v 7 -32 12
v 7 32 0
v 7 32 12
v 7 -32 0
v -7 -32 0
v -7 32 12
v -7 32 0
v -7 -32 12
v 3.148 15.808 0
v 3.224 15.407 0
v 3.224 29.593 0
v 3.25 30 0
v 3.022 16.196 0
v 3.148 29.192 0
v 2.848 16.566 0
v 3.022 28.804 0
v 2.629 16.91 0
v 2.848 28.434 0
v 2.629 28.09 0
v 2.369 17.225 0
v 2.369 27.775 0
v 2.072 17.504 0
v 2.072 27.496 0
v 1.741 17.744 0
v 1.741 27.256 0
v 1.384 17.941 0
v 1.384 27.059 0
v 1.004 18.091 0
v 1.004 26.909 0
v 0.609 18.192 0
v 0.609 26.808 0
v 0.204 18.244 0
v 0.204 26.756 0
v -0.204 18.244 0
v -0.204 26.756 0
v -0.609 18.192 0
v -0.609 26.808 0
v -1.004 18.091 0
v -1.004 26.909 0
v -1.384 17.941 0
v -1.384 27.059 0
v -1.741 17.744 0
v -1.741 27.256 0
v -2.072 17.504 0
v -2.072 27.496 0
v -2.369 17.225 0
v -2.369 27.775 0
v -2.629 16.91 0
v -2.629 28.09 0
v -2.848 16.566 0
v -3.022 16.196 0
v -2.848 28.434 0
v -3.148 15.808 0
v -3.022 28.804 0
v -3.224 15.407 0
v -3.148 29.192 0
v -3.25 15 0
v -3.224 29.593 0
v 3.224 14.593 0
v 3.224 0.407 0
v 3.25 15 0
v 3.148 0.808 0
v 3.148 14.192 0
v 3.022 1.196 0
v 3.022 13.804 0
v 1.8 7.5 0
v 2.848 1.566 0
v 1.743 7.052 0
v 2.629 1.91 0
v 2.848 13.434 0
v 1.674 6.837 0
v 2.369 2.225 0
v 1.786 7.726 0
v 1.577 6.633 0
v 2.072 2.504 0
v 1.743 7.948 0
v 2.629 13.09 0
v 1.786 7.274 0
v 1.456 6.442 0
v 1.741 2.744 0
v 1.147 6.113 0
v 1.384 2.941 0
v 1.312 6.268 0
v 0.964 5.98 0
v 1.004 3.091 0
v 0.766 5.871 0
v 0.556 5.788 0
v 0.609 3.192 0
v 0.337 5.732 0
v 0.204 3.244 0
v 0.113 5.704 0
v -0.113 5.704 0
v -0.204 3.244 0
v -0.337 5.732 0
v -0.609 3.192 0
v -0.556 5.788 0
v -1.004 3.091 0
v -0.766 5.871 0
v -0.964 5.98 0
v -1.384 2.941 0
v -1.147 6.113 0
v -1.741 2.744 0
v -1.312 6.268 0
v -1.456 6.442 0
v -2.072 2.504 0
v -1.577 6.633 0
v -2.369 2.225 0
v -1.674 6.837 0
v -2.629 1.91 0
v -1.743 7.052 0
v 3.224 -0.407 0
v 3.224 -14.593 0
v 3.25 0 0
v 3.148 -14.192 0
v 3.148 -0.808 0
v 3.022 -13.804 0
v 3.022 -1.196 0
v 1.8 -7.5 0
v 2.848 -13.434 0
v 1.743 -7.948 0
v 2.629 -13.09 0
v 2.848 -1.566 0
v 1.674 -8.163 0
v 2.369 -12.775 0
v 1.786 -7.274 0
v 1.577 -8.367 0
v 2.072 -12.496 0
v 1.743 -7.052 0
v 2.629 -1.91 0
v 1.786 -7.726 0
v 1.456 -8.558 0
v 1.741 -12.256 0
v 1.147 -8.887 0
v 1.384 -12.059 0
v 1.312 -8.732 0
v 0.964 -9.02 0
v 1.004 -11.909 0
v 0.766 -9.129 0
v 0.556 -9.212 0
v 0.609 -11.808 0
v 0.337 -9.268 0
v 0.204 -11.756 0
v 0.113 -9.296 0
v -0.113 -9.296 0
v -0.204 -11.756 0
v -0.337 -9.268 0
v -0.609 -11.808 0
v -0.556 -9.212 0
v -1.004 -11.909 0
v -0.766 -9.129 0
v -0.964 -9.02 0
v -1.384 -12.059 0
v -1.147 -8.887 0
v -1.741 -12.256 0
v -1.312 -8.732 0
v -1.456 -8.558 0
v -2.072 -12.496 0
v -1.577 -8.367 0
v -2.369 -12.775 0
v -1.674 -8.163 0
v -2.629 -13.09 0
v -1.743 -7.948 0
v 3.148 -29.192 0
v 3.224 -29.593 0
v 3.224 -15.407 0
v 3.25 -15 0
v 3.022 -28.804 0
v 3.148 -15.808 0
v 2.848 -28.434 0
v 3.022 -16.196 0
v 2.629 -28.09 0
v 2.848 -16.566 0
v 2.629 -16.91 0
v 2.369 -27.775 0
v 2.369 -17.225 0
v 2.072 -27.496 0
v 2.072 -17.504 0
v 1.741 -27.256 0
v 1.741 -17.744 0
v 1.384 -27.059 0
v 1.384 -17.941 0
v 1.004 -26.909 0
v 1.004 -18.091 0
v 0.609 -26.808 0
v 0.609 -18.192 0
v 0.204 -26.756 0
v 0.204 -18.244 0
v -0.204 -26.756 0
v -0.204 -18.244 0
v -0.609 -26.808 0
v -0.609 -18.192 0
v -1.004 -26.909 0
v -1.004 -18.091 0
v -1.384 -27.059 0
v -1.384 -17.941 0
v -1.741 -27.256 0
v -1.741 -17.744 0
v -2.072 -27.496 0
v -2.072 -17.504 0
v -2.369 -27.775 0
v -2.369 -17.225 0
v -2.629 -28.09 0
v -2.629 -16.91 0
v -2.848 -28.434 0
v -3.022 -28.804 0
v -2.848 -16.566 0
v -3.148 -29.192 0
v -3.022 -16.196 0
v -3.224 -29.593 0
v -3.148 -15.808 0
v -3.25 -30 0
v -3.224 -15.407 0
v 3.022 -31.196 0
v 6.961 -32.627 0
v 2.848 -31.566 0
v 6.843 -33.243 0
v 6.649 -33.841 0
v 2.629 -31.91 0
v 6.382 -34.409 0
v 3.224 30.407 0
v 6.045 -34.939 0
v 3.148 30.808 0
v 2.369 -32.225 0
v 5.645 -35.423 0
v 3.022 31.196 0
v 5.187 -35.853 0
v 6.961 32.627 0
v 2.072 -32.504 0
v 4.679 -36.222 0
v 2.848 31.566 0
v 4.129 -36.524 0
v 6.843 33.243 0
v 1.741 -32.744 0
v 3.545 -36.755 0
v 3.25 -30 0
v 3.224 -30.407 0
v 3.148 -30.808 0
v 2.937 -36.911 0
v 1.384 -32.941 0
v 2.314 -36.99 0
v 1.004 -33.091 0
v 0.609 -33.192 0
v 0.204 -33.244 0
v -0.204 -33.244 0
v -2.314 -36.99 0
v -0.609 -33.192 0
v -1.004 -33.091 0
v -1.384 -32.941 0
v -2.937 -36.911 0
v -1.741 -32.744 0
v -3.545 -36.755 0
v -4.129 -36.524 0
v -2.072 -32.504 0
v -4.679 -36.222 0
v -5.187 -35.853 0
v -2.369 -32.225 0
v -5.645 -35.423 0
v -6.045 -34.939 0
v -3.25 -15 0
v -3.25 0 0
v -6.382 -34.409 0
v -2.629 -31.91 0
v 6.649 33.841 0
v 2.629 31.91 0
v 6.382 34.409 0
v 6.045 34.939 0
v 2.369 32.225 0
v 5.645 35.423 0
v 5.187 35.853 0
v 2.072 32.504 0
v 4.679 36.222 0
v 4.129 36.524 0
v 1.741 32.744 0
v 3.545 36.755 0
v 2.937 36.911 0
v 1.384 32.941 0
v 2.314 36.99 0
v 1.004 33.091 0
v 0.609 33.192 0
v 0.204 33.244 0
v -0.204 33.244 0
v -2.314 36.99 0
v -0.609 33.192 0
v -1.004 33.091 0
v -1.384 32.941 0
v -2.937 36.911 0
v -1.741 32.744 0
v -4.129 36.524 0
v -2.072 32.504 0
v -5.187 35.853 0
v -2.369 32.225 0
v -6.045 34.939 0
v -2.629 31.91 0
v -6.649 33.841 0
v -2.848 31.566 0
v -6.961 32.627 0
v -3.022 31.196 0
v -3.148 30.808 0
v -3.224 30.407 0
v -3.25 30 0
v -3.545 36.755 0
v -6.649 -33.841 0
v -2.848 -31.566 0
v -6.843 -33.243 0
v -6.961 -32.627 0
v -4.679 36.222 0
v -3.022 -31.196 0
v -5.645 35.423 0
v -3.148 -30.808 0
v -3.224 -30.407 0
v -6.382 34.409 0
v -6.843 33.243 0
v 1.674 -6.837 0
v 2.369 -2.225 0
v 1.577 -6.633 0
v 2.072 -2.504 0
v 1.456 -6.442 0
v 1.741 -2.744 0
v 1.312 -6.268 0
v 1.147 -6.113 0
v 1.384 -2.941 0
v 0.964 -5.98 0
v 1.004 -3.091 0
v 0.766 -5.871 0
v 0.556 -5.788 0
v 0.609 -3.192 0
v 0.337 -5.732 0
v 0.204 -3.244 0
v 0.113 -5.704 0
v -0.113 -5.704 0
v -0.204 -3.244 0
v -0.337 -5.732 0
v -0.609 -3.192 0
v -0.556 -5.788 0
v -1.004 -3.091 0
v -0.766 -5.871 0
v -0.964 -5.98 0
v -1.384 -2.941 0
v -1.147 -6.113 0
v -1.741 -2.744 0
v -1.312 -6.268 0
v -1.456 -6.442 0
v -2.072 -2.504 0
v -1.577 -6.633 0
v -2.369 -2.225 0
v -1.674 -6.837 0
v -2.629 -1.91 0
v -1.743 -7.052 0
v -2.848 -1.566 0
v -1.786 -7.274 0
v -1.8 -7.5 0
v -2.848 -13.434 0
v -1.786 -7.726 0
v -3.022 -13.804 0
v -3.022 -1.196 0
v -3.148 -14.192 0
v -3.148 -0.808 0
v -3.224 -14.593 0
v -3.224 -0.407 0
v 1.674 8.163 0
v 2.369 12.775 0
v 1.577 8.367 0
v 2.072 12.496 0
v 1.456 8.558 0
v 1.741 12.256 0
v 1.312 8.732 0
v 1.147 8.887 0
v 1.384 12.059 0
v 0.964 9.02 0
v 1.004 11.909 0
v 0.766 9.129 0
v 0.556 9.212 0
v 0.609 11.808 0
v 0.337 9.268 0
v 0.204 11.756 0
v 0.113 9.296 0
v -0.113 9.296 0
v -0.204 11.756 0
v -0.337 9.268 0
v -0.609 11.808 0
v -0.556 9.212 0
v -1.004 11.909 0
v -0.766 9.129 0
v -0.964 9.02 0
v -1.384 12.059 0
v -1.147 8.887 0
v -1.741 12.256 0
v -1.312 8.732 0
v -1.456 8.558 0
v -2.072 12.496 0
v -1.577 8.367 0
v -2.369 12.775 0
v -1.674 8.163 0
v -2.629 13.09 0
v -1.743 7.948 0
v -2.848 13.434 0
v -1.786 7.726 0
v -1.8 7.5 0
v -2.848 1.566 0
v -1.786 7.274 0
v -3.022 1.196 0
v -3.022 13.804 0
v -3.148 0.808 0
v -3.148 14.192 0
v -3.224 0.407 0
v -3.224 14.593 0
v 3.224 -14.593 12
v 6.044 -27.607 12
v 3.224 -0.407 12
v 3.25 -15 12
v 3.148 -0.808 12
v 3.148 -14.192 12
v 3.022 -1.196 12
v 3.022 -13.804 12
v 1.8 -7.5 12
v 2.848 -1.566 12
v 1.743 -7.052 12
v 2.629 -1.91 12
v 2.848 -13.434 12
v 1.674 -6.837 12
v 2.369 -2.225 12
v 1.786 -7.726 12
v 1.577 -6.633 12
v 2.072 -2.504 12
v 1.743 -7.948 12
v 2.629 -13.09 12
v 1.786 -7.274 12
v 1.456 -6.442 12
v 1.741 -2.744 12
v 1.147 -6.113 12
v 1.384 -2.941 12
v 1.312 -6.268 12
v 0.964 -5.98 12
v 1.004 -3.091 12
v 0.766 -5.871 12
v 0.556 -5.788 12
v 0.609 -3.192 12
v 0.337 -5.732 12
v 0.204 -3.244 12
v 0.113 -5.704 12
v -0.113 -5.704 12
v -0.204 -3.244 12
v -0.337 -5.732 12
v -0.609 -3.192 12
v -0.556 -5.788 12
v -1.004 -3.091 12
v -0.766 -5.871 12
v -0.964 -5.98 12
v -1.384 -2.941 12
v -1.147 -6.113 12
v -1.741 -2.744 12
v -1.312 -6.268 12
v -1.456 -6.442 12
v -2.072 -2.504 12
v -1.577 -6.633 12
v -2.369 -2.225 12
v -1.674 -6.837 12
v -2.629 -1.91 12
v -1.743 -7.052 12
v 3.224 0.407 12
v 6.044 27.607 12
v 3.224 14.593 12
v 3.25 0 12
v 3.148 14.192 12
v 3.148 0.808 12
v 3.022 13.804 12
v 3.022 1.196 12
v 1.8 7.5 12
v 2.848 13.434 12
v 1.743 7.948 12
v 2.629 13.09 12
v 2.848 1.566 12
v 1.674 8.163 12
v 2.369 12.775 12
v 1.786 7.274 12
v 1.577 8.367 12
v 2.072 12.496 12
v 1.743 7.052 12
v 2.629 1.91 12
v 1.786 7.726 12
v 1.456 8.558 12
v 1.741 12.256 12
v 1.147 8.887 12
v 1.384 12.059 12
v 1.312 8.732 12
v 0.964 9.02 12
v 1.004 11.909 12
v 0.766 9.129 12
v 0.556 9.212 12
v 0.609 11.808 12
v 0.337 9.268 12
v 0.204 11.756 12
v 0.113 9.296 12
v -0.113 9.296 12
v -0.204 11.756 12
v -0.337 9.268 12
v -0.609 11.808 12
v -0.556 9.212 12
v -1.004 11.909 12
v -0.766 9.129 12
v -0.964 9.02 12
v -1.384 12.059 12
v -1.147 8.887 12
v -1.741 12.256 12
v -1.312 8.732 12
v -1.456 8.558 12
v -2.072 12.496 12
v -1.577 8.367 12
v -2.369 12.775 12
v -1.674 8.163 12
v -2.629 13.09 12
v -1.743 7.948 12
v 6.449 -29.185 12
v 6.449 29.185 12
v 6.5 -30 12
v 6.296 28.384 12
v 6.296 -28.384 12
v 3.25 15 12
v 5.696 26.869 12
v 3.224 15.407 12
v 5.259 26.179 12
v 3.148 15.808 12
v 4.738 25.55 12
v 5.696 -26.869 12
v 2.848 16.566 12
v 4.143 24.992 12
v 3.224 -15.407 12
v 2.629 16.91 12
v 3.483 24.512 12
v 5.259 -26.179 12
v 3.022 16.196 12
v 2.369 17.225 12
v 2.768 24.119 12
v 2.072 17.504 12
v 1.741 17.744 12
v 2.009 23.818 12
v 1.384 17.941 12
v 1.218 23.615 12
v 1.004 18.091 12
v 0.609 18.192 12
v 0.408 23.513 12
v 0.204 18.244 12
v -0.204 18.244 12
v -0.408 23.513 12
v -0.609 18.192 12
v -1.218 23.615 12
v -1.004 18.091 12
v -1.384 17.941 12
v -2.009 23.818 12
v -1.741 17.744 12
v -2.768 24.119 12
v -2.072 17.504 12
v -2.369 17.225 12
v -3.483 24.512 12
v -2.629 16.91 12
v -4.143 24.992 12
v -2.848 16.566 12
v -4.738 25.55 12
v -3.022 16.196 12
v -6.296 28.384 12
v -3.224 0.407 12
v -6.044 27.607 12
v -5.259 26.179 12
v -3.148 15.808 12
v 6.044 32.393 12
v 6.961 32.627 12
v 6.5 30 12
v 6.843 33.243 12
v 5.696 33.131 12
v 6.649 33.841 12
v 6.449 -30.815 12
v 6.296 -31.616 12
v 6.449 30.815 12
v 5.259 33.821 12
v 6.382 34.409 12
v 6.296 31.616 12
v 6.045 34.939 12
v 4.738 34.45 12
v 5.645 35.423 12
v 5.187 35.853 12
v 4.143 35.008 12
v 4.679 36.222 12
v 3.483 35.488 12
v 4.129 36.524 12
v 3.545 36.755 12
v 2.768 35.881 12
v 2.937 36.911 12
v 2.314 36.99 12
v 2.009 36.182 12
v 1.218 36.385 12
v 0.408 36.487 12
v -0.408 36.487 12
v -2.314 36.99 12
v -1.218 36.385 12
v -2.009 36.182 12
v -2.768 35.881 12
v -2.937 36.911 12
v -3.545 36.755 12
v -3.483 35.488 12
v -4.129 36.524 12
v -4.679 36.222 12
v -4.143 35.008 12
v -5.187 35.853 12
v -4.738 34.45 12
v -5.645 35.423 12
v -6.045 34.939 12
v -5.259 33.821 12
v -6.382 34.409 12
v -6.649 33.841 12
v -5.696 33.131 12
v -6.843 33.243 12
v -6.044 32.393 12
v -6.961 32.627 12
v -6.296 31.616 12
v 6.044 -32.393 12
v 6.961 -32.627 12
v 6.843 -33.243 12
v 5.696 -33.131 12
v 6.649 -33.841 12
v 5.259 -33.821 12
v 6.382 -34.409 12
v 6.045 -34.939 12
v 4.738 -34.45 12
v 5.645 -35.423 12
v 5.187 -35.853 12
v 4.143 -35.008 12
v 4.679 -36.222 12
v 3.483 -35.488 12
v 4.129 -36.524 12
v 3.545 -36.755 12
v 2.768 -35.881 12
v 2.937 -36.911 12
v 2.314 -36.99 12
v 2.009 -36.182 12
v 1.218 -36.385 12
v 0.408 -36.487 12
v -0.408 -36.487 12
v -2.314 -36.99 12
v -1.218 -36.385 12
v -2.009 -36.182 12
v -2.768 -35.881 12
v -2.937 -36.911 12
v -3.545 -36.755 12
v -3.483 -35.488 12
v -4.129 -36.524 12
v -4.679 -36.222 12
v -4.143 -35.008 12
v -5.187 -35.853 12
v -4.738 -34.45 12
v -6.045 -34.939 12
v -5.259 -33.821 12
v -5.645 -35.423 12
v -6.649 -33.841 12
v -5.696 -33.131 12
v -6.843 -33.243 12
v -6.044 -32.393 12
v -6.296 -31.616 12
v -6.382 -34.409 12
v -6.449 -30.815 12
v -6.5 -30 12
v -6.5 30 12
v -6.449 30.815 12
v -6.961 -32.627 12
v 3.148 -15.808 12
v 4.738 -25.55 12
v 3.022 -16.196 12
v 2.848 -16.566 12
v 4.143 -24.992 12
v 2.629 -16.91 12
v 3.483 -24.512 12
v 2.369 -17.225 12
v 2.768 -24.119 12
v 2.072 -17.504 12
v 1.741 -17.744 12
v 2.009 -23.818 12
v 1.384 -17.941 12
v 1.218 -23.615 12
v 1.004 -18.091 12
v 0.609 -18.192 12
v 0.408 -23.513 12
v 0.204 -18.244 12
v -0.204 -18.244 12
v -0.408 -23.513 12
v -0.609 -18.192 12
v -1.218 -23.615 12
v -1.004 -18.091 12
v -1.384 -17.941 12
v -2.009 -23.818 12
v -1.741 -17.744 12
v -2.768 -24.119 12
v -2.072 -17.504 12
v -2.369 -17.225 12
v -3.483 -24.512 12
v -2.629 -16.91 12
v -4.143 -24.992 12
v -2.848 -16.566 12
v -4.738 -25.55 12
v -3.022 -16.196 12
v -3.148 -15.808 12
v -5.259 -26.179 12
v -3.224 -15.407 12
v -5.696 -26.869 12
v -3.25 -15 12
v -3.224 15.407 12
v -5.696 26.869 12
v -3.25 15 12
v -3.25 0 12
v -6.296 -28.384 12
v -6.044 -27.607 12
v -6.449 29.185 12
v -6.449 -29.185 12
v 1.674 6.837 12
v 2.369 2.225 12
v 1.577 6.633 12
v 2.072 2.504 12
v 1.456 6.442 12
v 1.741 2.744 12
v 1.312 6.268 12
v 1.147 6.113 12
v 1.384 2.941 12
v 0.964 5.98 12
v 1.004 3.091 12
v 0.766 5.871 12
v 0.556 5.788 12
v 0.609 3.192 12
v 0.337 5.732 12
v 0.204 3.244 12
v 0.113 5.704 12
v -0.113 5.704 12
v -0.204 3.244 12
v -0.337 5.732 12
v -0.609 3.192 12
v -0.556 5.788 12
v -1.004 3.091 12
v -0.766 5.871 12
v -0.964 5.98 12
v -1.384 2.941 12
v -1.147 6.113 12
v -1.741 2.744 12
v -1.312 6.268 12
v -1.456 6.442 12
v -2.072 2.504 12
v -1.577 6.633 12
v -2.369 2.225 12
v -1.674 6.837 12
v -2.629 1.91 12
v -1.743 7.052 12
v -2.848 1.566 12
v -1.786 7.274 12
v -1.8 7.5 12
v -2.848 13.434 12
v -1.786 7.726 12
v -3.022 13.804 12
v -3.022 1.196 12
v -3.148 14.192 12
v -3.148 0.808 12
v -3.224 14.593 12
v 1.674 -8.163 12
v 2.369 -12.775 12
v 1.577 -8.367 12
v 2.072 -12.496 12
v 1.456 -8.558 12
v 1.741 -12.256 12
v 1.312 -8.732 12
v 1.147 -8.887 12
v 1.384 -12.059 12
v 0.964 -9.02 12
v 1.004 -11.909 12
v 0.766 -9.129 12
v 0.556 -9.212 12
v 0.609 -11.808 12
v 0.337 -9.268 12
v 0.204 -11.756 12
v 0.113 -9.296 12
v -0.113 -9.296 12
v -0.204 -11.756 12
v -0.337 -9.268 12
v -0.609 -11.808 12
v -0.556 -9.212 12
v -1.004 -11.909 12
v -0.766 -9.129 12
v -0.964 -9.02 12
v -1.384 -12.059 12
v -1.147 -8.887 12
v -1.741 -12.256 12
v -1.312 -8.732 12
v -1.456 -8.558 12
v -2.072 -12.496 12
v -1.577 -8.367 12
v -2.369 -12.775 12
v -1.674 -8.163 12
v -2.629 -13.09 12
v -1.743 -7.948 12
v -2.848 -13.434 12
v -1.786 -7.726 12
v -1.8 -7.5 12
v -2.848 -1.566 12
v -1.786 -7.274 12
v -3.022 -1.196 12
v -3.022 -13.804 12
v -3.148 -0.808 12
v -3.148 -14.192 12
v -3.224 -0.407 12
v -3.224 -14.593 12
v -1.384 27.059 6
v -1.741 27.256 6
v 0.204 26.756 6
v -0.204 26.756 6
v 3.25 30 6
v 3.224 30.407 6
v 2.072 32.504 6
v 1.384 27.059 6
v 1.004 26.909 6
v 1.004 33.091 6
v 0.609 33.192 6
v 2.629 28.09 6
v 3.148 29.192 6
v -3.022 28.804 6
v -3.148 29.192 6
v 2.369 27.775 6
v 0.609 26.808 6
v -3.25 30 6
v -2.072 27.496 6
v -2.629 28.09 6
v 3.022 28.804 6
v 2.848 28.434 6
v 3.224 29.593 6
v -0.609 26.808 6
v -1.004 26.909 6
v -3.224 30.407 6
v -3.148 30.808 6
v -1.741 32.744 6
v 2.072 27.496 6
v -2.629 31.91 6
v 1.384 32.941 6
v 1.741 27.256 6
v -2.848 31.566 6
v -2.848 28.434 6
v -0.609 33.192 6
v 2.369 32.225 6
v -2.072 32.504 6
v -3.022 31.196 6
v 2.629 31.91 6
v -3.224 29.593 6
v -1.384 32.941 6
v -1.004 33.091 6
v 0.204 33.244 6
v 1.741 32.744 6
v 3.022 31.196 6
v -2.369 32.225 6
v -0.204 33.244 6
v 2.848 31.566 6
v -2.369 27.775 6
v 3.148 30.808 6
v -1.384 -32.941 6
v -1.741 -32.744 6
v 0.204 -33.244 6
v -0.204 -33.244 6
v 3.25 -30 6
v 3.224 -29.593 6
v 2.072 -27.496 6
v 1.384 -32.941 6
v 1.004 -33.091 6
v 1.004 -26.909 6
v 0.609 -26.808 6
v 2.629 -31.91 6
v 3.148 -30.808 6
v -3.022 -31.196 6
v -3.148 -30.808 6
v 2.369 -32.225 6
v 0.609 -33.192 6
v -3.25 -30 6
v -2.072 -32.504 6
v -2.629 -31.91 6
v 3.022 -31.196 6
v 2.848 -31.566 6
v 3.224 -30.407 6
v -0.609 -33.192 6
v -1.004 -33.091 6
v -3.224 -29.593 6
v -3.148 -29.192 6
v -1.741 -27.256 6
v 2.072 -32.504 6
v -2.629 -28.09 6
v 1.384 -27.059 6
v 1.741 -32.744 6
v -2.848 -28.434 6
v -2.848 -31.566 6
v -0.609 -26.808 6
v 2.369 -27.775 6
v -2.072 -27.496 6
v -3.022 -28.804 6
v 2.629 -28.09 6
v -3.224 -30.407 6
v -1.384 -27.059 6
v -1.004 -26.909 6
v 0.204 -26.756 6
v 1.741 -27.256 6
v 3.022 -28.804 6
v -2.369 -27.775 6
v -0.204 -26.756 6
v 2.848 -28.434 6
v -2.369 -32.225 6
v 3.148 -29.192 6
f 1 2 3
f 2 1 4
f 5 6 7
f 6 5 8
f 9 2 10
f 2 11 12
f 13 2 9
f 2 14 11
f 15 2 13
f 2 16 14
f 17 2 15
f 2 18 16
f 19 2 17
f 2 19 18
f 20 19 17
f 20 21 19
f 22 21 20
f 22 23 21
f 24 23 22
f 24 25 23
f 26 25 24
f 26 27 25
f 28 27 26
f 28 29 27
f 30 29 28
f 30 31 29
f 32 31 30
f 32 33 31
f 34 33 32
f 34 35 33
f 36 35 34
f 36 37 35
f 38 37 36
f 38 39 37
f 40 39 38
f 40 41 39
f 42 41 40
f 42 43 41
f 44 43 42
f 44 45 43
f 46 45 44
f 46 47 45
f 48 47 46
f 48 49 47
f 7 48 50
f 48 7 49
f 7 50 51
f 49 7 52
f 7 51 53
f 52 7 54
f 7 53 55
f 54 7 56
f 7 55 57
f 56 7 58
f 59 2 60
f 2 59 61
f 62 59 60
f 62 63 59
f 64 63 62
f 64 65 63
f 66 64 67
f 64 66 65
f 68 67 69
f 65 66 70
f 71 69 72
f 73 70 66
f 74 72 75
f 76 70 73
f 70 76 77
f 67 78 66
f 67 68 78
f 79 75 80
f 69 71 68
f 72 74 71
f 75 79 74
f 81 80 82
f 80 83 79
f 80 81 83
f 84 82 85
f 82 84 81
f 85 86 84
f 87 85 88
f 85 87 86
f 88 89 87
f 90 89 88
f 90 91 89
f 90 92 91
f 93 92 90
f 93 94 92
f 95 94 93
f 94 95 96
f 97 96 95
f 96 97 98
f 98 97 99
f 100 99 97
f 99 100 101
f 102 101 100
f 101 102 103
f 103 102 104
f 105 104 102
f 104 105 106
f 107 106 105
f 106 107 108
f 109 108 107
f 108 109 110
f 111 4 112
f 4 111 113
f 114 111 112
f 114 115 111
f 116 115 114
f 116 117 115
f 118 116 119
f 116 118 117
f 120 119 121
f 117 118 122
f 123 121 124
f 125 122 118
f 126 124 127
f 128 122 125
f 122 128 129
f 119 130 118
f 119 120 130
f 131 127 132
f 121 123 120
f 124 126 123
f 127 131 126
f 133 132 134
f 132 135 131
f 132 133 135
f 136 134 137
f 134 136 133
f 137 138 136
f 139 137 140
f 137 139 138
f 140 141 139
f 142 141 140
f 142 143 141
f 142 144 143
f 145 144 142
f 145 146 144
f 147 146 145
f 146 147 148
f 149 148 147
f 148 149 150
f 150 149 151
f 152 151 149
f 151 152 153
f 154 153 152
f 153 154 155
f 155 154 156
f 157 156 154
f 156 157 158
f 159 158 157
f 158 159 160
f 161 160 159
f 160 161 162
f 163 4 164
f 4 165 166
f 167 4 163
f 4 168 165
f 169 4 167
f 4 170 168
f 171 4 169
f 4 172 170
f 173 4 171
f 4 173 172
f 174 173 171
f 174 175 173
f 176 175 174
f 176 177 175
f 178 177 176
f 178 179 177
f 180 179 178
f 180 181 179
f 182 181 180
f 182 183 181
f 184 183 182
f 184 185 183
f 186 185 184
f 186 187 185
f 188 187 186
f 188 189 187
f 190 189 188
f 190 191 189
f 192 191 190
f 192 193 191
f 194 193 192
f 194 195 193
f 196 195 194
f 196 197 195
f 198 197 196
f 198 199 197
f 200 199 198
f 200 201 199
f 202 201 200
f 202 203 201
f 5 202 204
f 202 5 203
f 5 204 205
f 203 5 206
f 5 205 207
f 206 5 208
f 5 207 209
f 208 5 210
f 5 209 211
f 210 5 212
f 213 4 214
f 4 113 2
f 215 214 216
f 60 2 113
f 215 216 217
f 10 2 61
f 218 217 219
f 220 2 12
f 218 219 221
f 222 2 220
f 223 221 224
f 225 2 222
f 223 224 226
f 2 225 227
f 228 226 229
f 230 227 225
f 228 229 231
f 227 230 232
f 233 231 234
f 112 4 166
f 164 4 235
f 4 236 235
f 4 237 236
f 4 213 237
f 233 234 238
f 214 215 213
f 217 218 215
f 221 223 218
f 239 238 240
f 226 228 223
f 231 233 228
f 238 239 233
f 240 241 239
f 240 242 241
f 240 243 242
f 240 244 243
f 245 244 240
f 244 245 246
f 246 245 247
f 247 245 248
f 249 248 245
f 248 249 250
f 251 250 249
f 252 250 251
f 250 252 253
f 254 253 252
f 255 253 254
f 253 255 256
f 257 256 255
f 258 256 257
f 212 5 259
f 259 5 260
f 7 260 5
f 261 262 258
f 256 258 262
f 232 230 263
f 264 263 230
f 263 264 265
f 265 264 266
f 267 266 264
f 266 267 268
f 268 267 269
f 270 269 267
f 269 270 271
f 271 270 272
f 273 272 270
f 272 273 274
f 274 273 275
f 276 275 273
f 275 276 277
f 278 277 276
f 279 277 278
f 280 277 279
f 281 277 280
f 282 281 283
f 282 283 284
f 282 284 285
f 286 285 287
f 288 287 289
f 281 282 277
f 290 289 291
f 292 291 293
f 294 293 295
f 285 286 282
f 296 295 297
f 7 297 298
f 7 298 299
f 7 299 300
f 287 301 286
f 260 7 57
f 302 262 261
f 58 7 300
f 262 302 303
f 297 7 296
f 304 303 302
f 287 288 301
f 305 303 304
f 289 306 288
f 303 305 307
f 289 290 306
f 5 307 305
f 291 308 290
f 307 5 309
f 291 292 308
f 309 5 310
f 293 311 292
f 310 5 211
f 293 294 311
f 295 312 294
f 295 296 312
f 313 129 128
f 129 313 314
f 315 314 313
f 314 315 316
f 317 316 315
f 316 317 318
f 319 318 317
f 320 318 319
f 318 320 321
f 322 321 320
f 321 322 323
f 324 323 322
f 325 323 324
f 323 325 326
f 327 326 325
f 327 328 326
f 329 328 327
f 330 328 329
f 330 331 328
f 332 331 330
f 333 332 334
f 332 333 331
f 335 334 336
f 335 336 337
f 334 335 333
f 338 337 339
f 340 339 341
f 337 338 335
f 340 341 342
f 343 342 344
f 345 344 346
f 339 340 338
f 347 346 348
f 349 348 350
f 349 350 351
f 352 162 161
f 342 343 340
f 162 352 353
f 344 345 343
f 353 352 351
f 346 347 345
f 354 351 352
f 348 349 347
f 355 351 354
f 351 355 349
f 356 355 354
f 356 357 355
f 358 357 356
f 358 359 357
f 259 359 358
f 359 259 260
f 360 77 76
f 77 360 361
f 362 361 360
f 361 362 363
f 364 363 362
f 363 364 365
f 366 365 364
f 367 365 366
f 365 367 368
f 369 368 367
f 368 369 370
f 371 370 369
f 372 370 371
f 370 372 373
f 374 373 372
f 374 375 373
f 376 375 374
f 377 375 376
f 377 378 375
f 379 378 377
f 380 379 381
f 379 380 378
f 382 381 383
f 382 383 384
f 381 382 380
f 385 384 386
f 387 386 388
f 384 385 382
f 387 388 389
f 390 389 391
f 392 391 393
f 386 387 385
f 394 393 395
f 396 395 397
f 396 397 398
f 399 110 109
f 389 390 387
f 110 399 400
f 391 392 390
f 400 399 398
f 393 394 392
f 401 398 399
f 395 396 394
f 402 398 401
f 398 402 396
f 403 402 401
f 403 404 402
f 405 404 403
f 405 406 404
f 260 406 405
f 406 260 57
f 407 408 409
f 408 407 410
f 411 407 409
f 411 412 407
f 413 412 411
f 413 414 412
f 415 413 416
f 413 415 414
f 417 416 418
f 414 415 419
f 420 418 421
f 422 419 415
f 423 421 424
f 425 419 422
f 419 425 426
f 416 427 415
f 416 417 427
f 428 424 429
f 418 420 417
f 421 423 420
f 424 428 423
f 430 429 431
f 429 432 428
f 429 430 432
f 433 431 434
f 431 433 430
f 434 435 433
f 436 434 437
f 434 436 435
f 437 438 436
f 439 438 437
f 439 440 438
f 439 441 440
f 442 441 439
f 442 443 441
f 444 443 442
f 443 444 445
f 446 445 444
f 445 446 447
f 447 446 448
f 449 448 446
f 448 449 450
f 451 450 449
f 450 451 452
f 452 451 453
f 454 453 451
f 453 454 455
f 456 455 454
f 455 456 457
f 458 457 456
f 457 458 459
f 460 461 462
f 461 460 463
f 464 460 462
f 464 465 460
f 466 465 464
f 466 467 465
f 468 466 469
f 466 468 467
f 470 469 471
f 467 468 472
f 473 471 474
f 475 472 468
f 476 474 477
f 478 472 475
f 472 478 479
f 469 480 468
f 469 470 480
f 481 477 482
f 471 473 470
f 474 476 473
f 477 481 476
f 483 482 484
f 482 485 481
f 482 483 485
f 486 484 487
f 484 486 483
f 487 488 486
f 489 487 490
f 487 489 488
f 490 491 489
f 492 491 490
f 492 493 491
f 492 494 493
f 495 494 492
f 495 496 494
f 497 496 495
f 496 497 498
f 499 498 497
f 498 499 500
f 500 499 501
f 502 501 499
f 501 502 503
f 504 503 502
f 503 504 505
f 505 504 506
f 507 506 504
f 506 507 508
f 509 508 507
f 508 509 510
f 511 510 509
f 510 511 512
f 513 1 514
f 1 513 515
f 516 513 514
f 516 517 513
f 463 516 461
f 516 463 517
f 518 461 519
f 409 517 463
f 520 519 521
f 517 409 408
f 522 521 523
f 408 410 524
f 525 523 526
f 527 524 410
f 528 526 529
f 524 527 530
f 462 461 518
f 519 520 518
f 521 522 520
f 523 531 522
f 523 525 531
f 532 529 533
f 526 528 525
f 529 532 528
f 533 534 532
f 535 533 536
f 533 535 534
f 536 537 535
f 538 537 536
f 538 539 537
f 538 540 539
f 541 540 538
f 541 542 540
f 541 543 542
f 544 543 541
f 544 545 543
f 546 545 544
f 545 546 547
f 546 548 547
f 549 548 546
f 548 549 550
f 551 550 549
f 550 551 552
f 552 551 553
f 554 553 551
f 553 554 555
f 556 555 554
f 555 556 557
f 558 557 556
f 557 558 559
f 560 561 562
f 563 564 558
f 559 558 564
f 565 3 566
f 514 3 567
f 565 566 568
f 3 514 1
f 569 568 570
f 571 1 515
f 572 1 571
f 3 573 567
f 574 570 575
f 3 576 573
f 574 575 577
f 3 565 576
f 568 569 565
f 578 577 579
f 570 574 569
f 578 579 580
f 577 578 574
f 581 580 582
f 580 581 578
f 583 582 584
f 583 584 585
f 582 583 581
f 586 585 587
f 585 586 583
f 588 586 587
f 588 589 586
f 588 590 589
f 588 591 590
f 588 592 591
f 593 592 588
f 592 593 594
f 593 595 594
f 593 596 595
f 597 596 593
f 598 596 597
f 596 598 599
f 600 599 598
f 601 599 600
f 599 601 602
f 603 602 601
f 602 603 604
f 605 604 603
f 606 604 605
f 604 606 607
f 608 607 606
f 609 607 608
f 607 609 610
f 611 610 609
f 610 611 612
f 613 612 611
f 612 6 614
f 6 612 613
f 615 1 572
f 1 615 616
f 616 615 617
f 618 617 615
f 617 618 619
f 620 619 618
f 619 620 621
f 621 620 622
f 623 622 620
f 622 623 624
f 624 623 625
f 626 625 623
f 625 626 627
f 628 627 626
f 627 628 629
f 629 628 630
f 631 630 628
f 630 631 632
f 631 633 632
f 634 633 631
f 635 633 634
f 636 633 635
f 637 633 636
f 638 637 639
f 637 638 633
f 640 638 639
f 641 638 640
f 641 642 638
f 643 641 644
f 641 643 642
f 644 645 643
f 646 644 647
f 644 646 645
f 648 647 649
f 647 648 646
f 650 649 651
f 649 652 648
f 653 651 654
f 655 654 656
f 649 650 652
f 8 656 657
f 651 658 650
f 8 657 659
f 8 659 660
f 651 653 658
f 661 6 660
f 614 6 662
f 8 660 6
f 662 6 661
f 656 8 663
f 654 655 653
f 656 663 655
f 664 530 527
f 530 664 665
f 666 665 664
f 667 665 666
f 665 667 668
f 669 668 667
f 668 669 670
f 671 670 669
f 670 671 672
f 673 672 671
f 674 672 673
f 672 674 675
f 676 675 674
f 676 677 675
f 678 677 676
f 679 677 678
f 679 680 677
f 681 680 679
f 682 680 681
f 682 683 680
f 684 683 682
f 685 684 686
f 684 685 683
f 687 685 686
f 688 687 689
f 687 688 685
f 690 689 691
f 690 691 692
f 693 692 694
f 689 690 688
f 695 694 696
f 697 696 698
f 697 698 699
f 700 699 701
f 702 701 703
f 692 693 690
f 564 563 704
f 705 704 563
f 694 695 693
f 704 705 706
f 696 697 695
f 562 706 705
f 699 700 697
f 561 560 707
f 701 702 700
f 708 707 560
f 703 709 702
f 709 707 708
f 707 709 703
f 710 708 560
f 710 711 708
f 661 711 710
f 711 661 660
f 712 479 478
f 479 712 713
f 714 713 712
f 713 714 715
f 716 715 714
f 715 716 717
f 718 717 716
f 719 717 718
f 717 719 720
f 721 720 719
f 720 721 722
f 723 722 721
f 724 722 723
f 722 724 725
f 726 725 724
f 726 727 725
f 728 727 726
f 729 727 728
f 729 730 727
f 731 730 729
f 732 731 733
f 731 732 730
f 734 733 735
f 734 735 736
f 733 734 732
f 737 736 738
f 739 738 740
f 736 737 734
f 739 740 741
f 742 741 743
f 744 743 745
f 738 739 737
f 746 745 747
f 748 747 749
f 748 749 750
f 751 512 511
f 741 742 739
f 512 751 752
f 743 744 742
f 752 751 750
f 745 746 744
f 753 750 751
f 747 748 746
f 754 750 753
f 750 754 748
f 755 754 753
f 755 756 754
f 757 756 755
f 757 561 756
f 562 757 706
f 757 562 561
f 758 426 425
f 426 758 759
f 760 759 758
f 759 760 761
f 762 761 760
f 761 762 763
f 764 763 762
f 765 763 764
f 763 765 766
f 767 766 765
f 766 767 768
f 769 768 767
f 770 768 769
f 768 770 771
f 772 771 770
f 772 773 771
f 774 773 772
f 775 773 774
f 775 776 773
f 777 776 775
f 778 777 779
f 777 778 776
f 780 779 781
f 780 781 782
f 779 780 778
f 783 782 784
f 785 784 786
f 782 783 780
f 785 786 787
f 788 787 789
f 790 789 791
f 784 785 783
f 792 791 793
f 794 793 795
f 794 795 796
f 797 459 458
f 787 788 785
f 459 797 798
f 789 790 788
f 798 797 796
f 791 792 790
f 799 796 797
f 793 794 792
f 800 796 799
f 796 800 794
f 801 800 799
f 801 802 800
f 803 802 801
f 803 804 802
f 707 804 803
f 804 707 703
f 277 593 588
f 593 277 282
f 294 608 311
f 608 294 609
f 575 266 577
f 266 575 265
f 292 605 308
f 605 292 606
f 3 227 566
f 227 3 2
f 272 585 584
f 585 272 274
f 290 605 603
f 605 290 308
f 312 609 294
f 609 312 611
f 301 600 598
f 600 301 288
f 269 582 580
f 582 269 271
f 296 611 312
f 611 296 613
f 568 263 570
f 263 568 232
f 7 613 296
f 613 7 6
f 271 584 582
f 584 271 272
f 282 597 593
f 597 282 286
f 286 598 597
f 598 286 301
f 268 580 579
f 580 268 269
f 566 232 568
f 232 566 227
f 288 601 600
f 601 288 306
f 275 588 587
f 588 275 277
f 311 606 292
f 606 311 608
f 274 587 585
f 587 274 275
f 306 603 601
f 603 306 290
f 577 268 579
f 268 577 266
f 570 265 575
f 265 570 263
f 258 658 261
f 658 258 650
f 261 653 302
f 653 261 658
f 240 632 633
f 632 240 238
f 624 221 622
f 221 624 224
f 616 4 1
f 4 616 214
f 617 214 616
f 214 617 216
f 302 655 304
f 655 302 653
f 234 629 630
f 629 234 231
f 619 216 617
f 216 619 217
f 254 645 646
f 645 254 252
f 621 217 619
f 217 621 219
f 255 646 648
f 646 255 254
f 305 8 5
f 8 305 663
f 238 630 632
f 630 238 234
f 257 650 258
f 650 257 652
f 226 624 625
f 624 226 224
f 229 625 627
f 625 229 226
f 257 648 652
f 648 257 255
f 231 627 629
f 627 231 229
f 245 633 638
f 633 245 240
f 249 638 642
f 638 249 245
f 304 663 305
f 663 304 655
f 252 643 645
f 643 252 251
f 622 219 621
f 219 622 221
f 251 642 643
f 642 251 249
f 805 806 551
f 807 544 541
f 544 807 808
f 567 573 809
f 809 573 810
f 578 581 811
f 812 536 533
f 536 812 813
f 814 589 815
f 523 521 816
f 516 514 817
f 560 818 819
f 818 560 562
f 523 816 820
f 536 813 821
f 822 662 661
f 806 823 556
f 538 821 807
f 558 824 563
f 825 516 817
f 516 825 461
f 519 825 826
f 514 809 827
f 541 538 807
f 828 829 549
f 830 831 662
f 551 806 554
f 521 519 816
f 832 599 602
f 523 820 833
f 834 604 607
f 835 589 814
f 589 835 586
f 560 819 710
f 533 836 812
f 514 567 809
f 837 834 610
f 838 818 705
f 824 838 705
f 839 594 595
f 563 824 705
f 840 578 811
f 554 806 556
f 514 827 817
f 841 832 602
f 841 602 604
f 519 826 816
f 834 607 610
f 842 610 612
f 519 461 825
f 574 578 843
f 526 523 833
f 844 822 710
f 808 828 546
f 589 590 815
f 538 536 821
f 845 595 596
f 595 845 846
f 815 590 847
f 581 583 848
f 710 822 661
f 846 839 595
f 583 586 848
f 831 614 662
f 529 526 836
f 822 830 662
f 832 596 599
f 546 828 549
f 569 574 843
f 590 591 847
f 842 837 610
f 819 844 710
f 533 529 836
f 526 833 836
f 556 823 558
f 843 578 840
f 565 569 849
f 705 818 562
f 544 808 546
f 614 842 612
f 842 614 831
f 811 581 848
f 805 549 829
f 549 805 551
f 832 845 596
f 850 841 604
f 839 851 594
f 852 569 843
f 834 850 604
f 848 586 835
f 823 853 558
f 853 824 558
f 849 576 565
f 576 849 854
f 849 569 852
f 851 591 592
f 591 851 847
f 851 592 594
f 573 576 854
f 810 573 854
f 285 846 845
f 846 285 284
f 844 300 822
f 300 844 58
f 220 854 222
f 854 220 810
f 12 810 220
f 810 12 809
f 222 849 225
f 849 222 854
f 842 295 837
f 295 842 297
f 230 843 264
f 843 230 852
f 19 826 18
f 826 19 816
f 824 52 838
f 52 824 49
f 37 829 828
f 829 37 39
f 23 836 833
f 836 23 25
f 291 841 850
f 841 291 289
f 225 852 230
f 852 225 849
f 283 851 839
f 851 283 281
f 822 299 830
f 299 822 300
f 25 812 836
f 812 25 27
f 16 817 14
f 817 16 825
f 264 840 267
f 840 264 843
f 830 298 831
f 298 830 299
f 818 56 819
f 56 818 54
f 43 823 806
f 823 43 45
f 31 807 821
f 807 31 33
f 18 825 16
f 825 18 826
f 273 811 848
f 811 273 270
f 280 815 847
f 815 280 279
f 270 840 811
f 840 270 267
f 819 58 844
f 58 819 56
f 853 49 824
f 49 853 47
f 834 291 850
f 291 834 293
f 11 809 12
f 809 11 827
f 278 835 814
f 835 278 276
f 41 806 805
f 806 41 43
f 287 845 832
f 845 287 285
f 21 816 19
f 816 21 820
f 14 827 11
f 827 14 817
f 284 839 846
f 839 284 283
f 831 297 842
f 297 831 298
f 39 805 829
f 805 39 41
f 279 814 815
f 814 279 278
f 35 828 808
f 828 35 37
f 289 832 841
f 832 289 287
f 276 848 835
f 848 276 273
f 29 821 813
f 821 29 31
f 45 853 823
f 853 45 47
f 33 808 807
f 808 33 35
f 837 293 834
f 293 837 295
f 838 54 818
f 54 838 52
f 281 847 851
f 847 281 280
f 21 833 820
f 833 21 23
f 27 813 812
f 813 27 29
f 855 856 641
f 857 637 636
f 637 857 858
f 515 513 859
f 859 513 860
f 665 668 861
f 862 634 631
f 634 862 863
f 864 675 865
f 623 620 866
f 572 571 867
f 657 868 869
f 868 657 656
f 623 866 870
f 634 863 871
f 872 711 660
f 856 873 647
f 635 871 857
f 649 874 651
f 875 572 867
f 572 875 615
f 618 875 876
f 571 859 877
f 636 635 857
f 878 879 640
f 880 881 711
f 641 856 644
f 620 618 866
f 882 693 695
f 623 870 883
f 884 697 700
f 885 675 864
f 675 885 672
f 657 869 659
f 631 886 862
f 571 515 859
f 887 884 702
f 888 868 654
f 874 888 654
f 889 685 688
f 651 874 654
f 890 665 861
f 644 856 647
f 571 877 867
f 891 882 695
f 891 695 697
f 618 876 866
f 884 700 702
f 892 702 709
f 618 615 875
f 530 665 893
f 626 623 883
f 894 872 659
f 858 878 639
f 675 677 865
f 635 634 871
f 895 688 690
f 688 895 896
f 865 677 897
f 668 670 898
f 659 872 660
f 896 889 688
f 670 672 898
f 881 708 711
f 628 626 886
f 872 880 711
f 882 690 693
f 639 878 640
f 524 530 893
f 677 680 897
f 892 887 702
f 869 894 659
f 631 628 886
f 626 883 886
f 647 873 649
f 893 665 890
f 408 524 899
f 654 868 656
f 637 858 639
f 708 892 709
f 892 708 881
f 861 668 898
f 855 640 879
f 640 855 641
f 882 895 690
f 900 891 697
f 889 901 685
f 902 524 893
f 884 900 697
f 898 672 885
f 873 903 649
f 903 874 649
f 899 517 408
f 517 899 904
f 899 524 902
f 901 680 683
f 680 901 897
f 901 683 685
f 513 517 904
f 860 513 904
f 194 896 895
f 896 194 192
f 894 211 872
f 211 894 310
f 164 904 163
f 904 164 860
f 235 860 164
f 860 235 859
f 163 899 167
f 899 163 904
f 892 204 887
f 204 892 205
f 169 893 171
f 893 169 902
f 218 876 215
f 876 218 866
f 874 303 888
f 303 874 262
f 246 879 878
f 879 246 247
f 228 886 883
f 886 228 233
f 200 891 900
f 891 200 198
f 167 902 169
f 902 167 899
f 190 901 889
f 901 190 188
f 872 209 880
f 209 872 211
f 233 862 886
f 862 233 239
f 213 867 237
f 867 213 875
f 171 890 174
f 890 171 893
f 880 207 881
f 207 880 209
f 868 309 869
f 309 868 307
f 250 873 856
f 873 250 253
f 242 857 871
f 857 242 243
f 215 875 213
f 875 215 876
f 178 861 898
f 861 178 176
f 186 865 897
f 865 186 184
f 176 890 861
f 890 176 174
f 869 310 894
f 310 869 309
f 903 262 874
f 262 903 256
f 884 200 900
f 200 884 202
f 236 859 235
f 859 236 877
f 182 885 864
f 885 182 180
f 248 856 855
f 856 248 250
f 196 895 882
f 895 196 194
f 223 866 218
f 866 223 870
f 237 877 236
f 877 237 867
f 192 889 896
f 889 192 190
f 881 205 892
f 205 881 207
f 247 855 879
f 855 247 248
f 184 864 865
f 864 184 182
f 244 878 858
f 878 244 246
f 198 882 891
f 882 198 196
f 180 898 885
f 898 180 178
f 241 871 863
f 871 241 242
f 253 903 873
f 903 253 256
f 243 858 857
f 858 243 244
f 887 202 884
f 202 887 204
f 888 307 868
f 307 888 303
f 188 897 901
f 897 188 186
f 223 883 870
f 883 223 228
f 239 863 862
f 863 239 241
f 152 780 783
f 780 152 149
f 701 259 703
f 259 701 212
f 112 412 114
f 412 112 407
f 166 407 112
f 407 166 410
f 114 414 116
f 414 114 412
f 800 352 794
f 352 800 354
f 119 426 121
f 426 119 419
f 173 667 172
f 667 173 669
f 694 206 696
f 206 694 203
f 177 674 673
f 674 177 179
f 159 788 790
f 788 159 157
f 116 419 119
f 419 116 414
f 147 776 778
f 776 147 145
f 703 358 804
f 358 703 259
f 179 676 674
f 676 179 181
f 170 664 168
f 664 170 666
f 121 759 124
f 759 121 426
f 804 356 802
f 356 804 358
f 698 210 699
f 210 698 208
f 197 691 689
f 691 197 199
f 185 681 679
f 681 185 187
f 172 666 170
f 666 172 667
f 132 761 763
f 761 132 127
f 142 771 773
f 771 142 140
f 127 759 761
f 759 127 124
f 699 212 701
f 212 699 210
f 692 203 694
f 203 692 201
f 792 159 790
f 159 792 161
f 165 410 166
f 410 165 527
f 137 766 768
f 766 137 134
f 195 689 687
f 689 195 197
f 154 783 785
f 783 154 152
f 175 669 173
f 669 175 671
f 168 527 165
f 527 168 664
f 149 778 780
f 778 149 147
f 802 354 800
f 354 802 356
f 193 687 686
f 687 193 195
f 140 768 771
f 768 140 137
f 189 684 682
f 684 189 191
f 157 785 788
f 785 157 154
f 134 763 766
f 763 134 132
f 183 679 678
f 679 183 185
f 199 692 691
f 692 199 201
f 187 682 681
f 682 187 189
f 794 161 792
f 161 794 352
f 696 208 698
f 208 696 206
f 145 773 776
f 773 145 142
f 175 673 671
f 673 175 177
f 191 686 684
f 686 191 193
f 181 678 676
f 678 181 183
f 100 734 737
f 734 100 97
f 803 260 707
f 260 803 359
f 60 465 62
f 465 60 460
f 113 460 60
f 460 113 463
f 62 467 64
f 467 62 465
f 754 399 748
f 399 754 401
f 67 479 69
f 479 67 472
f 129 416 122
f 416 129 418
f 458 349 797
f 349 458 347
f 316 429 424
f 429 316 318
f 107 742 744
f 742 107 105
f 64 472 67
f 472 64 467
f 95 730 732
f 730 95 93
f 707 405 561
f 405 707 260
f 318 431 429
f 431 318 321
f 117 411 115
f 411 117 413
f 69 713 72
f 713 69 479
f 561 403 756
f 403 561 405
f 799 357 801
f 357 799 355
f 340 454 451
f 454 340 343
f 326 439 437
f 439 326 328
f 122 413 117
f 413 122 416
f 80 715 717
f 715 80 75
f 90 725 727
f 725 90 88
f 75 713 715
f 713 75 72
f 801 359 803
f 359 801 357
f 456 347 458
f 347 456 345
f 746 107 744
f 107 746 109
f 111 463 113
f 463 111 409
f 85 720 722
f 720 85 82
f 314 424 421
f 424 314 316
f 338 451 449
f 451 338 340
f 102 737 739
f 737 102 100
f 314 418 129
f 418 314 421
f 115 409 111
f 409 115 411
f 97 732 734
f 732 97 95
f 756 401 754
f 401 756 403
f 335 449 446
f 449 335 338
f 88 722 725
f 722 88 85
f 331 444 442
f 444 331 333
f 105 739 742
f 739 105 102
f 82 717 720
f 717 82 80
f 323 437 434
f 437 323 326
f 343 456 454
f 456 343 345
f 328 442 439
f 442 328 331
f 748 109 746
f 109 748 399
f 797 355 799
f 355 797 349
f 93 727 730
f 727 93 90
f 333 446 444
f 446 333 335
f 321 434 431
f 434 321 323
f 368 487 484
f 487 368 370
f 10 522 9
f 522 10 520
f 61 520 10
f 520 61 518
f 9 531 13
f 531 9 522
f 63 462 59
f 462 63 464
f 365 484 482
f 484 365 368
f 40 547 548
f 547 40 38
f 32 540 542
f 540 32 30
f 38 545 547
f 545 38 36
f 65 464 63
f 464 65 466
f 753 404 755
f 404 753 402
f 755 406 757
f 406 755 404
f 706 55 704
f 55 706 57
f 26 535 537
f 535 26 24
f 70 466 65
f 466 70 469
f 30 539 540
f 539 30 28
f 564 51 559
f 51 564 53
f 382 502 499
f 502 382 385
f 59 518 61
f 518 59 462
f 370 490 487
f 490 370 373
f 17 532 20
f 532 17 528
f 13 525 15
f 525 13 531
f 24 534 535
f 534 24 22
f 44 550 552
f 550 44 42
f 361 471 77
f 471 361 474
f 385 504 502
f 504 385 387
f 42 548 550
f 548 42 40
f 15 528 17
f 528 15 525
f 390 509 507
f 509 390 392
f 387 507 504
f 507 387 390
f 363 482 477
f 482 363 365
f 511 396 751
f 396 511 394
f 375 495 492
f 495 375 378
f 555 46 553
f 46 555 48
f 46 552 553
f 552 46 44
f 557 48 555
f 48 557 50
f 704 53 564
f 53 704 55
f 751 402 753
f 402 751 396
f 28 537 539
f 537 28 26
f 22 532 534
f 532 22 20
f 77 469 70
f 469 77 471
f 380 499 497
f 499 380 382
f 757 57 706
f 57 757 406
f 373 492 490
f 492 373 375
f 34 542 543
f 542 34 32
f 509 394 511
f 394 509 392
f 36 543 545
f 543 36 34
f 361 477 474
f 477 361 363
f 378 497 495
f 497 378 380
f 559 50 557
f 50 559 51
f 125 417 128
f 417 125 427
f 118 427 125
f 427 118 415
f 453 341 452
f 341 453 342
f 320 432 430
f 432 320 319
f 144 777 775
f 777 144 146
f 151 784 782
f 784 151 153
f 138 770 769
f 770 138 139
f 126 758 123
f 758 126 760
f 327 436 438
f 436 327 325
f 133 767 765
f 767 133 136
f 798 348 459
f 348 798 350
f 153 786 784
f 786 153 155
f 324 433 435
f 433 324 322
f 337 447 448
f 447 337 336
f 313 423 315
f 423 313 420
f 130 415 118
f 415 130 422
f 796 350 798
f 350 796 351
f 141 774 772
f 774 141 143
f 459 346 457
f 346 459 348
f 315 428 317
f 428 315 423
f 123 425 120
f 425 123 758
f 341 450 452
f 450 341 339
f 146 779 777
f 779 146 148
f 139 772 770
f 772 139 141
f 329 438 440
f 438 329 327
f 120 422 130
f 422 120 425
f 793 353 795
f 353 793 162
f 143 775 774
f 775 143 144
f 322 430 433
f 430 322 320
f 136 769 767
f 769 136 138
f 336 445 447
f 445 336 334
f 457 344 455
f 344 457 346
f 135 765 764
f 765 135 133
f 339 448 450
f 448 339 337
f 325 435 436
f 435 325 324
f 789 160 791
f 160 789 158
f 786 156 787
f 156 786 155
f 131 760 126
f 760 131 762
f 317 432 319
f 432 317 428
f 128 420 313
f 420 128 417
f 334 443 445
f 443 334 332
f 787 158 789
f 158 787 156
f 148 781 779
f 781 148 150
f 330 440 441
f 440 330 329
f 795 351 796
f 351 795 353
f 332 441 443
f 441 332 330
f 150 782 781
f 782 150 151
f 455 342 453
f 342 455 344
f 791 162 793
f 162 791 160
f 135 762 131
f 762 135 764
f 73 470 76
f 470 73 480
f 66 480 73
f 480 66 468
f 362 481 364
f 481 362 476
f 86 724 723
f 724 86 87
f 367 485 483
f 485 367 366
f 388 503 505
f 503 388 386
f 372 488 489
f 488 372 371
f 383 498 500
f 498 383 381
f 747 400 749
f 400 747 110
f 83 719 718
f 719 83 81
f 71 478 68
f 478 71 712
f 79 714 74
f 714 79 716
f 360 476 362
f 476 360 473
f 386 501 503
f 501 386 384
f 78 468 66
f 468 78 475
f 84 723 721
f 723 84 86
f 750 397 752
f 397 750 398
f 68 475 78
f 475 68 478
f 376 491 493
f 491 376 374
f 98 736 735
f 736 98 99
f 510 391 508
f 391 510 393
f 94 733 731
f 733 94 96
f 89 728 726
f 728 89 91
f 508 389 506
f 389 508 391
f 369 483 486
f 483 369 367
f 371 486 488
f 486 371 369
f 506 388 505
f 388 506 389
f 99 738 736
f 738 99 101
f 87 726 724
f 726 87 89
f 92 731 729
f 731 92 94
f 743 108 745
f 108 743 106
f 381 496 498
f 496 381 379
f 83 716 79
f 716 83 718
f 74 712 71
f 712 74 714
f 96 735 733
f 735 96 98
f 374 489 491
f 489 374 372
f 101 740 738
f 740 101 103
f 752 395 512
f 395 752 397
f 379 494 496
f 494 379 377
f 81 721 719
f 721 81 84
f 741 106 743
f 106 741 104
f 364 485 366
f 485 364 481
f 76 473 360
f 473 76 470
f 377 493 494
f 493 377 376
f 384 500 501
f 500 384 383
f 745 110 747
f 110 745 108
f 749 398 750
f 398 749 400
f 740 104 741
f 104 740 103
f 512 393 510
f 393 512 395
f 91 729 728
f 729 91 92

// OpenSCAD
$fn = 50;


difference() {
	union() {
		hull() {
			translate(v = [-2.0000000000, 17.0000000000, 0]) {
				cylinder(h = 12, r = 5);
			}
			translate(v = [2.0000000000, 17.0000000000, 0]) {
				cylinder(h = 12, r = 5);
			}
			translate(v = [-2.0000000000, -17.0000000000, 0]) {
				cylinder(h = 12, r = 5);
			}
			translate(v = [2.0000000000, -17.0000000000, 0]) {
				cylinder(h = 12, r = 5);
			}
		}
		translate(v = [0.0000000000, 22.5000000000, 0]) {
			hull() {
				translate(v = [-2.0000000000, 9.5000000000, 0]) {
					cylinder(h = 12, r = 5);
				}
				translate(v = [2.0000000000, 9.5000000000, 0]) {
					cylinder(h = 12, r = 5);
				}
				translate(v = [-2.0000000000, -9.5000000000, 0]) {
					cylinder(h = 12, r = 5);
				}
				translate(v = [2.0000000000, -9.5000000000, 0]) {
					cylinder(h = 12, r = 5);
				}
			}
		}
		translate(v = [0.0000000000, 22.5000000000, 0]) {
			hull() {
				translate(v = [-2.0000000000, 9.5000000000, 0]) {
					cylinder(h = 12, r = 5);
				}
				translate(v = [2.0000000000, 9.5000000000, 0]) {
					cylinder(h = 12, r = 5);
				}
				translate(v = [-2.0000000000, -9.5000000000, 0]) {
					cylinder(h = 12, r = 5);
				}
				translate(v = [2.0000000000, -9.5000000000, 0]) {
					cylinder(h = 12, r = 5);
				}
			}
		}
		translate(v = [0.0000000000, -22.5000000000, 0]) {
			hull() {
				translate(v = [-2.0000000000, 9.5000000000, 0]) {
					cylinder(h = 12, r = 5);
				}
				translate(v = [2.0000000000, 9.5000000000, 0]) {
					cylinder(h = 12, r = 5);
				}
				translate(v = [-2.0000000000, -9.5000000000, 0]) {
					cylinder(h = 12, r = 5);
				}
				translate(v = [2.0000000000, -9.5000000000, 0]) {
					cylinder(h = 12, r = 5);
				}
			}
		}
		translate(v = [0.0000000000, -22.5000000000, 0]) {
			hull() {
				translate(v = [-2.0000000000, 9.5000000000, 0]) {
					cylinder(h = 12, r = 5);
				}
				translate(v = [2.0000000000, 9.5000000000, 0]) {
					cylinder(h = 12, r = 5);
				}
				translate(v = [-2.0000000000, -9.5000000000, 0]) {
					cylinder(h = 12, r = 5);
				}
				translate(v = [2.0000000000, -9.5000000000, 0]) {
					cylinder(h = 12, r = 5);
				}
			}
		}
	}
	union() {
		translate(v = [0.0000000000, 30.0000000000, 12]) {
			rotate(a = [0, 0, 0]) {
				difference() {
					union() {
						#translate(v = [0, 0, -12.0000000000]) {
							cylinder(h = 12, r = 2.2500000000);
						}
						#translate(v = [0, 0, -6]) {
							cylinder(h = 6, r1 = 3.2500000000, r2 = 6.5000000000);
						}
						#translate(v = [0, 0, -12.0000000000]) {
							cylinder(h = 12, r = 3.2500000000);
						}
						#translate(v = [0, 0, -12.0000000000]) {
							cylinder(h = 12, r = 2.2500000000);
						}
					}
					union();
				}
			}
		}
		translate(v = [0.0000000000, 30.0000000000, 12]) {
			rotate(a = [0, 0, 0]) {
				difference() {
					union() {
						#translate(v = [0, 0, -12.0000000000]) {
							cylinder(h = 12, r = 2.2500000000);
						}
						#translate(v = [0, 0, -6]) {
							cylinder(h = 6, r1 = 3.2500000000, r2 = 6.5000000000);
						}
						#translate(v = [0, 0, -12.0000000000]) {
							cylinder(h = 12, r = 3.2500000000);
						}
						#translate(v = [0, 0, -12.0000000000]) {
							cylinder(h = 12, r = 2.2500000000);
						}
					}
					union();
				}
			}
		}
		translate(v = [0.0000000000, -30.0000000000, 12]) {
			rotate(a = [0, 0, 0]) {
				difference() {
					union() {
						#translate(v = [0, 0, -12.0000000000]) {
							cylinder(h = 12, r = 2.2500000000);
						}
						#translate(v = [0, 0, -6]) {
							cylinder(h = 6, r1 = 3.2500000000, r2 = 6.5000000000);
						}
						#translate(v = [0, 0, -12.0000000000]) {
							cylinder(h = 12, r = 3.2500000000);
						}
						#translate(v = [0, 0, -12.0000000000]) {
							cylinder(h = 12, r = 2.2500000000);
						}
					}
					union();
				}
			}
		}
		translate(v = [0.0000000000, -30.0000000000, 12]) {
			rotate(a = [0, 0, 0]) {
				difference() {
					union() {
						#translate(v = [0, 0, -12.0000000000]) {
							cylinder(h = 12, r = 2.2500000000);
						}
						#translate(v = [0, 0, -6]) {
							cylinder(h = 6, r1 = 3.2500000000, r2 = 6.5000000000);
						}
						#translate(v = [0, 0, -12.0000000000]) {
							cylinder(h = 12, r = 3.2500000000);
						}
						#translate(v = [0, 0, -12.0000000000]) {
							cylinder(h = 12, r = 2.2500000000);
						}
					}
					union();
				}
			}
		}
		translate(v = [0.0000000000, -15.0000000000, 0]) {
			translate(v = [0, 0, -100]) {
				cylinder(h = 200, r = 3.2500000000);
			}
		}
		translate(v = [0, 0, -100]) {
			cylinder(h = 200, r = 3.2500000000);
		}
		translate(v = [0.0000000000, 15.0000000000, 0]) {
			translate(v = [0, 0, -100]) {
				cylinder(h = 200, r = 3.2500000000);
			}
		}
		translate(v = [0.0000000000, -15.0000000000, 0]) {
			translate(v = [0, 0, -100]) {
				cylinder(h = 200, r = 1.8000000000);
			}
		}
		translate(v = [0.0000000000, -7.5000000000, 0]) {
			translate(v = [0, 0, -100]) {
				cylinder(h = 200, r = 1.8000000000);
			}
		}
		translate(v = [0, 0, -100]) {
			cylinder(h = 200, r = 1.8000000000);
		}
		translate(v = [0.0000000000, 7.5000000000, 0]) {
			translate(v = [0, 0, -100]) {
				cylinder(h = 200, r = 1.8000000000);
			}
		}
		translate(v = [0.0000000000, 15.0000000000, 0]) {
			translate(v = [0, 0, -100]) {
				cylinder(h = 200, r = 1.8000000000);
			}
		}
	}
}
